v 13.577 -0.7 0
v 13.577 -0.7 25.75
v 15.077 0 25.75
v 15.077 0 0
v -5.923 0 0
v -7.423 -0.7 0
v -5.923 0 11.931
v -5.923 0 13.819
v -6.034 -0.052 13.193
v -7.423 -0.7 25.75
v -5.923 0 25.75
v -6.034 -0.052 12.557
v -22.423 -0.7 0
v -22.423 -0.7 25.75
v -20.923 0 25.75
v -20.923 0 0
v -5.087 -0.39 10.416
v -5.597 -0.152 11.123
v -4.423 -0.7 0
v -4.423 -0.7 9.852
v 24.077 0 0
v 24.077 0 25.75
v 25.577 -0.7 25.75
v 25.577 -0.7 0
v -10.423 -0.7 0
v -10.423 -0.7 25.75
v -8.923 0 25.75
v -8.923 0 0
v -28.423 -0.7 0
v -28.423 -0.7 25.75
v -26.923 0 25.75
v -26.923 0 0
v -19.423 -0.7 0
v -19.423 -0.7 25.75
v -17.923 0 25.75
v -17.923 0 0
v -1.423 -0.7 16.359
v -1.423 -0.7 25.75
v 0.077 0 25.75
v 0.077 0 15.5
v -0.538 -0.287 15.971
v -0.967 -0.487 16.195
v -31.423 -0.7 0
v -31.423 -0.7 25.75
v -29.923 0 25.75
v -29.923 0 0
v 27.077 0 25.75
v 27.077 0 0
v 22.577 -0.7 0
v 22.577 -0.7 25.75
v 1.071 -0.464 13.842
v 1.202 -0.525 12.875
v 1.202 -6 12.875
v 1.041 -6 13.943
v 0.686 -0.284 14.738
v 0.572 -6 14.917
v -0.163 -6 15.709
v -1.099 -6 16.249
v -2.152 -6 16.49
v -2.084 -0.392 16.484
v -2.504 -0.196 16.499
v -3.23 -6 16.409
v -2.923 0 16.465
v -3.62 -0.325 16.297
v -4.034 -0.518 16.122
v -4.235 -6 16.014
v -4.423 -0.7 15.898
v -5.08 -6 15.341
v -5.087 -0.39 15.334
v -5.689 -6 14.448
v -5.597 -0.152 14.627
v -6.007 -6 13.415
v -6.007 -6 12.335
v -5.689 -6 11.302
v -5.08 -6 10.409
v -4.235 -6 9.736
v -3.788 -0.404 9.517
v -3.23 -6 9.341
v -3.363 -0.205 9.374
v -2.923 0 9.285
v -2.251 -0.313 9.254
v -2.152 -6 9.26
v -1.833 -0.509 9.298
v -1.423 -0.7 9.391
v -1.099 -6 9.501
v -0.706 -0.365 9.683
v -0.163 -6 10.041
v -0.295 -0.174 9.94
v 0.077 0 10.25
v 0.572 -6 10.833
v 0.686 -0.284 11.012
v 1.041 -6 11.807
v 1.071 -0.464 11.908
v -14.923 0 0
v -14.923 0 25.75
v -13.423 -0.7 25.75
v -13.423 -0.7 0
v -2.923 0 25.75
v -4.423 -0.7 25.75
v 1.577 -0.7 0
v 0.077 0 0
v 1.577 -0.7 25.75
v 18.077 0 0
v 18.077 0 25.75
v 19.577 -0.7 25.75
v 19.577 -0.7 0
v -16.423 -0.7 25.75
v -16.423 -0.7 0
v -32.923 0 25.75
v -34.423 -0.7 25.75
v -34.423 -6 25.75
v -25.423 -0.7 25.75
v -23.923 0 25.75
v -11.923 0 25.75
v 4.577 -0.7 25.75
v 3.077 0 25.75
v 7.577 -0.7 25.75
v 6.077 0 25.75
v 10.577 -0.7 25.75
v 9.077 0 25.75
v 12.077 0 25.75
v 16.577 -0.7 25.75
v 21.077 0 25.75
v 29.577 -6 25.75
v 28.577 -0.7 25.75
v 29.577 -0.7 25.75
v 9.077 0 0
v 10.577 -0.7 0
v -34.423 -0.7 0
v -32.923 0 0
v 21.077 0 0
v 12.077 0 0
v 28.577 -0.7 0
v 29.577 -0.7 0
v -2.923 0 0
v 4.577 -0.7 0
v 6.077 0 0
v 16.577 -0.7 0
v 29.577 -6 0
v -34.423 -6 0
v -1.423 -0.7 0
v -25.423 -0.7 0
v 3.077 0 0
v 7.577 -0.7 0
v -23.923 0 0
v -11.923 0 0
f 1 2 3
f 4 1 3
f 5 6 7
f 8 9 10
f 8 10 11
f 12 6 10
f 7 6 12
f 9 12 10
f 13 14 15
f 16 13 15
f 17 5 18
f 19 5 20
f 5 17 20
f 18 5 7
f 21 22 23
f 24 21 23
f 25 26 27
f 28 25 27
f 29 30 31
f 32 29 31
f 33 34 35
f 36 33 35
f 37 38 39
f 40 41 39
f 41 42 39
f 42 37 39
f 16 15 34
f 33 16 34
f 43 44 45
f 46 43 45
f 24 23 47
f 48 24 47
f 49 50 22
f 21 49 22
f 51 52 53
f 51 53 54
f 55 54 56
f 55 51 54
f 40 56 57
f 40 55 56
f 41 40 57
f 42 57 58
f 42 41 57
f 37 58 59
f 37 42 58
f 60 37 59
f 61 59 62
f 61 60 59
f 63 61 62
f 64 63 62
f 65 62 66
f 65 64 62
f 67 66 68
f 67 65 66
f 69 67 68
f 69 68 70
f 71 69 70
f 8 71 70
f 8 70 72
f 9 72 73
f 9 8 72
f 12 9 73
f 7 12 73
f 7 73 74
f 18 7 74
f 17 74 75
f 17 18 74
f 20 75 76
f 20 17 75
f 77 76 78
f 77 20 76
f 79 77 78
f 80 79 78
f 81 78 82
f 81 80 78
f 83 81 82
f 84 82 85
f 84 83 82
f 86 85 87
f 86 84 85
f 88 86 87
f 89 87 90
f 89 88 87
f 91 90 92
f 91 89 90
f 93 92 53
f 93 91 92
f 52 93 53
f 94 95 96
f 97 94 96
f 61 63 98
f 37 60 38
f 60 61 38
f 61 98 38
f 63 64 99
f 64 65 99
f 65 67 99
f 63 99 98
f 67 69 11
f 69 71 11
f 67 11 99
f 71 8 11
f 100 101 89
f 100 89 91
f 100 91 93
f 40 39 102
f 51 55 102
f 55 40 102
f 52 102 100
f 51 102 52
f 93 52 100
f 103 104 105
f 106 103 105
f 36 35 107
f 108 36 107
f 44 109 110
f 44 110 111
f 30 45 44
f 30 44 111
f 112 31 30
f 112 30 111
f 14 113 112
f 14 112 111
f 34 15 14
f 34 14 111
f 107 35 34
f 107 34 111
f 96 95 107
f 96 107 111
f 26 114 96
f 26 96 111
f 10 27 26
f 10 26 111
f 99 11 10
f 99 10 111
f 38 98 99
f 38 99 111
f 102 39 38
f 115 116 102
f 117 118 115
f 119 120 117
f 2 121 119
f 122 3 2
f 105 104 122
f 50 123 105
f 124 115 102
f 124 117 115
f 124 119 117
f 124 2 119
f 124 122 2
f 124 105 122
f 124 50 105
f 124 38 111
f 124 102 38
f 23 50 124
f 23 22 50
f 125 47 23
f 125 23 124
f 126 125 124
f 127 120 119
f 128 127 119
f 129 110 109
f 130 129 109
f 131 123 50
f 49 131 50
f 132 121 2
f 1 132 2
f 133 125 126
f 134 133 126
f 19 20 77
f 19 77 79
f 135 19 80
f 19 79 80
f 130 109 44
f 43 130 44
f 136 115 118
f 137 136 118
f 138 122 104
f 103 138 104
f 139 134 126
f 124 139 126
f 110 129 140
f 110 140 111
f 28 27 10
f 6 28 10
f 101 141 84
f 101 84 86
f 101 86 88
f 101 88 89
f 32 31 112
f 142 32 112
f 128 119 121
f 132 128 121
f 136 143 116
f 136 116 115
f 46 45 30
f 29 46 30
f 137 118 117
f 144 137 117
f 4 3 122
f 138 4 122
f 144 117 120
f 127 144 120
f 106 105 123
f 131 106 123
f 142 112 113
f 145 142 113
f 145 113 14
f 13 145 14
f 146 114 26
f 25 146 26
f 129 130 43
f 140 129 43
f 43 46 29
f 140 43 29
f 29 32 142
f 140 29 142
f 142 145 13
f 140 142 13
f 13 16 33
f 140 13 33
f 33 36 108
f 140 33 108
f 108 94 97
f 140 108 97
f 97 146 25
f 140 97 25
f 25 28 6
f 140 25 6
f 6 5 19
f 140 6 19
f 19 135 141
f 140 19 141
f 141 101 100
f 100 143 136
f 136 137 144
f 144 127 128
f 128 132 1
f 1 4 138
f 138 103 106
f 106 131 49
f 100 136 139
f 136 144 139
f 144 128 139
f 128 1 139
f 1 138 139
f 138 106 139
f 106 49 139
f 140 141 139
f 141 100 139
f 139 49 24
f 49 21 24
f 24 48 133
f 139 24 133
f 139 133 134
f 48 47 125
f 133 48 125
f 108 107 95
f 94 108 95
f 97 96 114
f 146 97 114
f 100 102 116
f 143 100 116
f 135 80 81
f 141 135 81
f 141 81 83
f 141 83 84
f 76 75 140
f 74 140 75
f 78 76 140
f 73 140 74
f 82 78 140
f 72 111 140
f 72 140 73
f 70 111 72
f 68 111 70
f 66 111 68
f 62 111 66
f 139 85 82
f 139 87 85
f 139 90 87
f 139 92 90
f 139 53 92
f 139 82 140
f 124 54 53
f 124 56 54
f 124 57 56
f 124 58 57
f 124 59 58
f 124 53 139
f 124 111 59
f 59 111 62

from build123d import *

# Parameters (mm, degrees)
F0_W     = 64
F0_H     = 25.75
F0_R     = 3.625
F1_DEPTH = 6
F3_DEPTH = 26.50399


with BuildPart() as f1:
    # F0 (on Front) → F1 (new body)
    with BuildSketch(Plane.XZ):
        with Locations((-2.422976, 12.875)):
            Rectangle(F0_W, F0_H)
        with Locations((-2.422976, 12.875)):
            Circle(F0_R, mode=Mode.SUBTRACT)
    extrude(amount=F1_DEPTH)

    # F2 (on face) → F3 (cut)
    with BuildSketch(Plane.XY.offset(25.75)):
        Polygon((-34.422976, 0), (-34.422976, -0.7), (-32.922976, 0), align=None)
        Polygon((-32.922976, 0), (-31.422976, -0.7), (-29.922976, 0), align=None)
        Polygon((-29.922976, 0), (-28.422976, -0.7), (-26.922976, 0), align=None)
        Polygon((-26.922976, 0), (-25.422976, -0.7), (-23.922976, 0), align=None)
        Polygon((-23.922976, 0), (-22.422976, -0.7), (-20.922976, 0), align=None)
        Polygon((-20.922976, 0), (-19.422976, -0.7), (-17.922976, 0), align=None)
        Polygon((-17.922976, 0), (-16.422976, -0.7), (-14.922976, 0), align=None)
        Polygon((-14.922976, 0), (-13.422976, -0.7), (-11.922976, 0), align=None)
        Polygon((-11.922976, 0), (-10.422976, -0.7), (-8.922976, 0), align=None)
        Polygon((-8.922976, 0), (-7.422976, -0.7), (-5.922976, 0), align=None)
        Polygon((-5.922976, 0), (-4.422976, -0.7), (-2.922976, 0), align=None)
        Polygon((-2.922976, 0), (-1.422976, -0.7), (0.077024, 0), align=None)
        Polygon((0.077024, 0), (1.577024, -0.7), (3.077024, 0), align=None)
        Polygon((4.577024, -0.7), (6.077024, 0), (3.077024, 0), align=None)
        Polygon((7.577024, -0.7), (9.077024, 0), (6.077024, 0), align=None)
        Polygon((10.577024, -0.7), (12.077024, 0), (9.077024, 0), align=None)
        Polygon((13.577024, -0.7), (15.077024, 0), (12.077024, 0), align=None)
        Polygon((16.577024, -0.7), (18.077024, 0), (15.077024, 0), align=None)
        Polygon((19.577024, -0.7), (21.077024, 0), (18.077024, 0), align=None)
        Polygon((22.577024, -0.7), (24.077024, 0), (21.077024, 0), align=None)
        Polygon((25.577024, -0.7), (27.077024, 0), (24.077024, 0), align=None)
        Polygon((28.577024, -0.7), (29.577024, -0.7), (29.577024, 0), (27.077024, 0), align=None)
    extrude(amount=-F3_DEPTH, mode=Mode.SUBTRACT)


solid = f1.part
